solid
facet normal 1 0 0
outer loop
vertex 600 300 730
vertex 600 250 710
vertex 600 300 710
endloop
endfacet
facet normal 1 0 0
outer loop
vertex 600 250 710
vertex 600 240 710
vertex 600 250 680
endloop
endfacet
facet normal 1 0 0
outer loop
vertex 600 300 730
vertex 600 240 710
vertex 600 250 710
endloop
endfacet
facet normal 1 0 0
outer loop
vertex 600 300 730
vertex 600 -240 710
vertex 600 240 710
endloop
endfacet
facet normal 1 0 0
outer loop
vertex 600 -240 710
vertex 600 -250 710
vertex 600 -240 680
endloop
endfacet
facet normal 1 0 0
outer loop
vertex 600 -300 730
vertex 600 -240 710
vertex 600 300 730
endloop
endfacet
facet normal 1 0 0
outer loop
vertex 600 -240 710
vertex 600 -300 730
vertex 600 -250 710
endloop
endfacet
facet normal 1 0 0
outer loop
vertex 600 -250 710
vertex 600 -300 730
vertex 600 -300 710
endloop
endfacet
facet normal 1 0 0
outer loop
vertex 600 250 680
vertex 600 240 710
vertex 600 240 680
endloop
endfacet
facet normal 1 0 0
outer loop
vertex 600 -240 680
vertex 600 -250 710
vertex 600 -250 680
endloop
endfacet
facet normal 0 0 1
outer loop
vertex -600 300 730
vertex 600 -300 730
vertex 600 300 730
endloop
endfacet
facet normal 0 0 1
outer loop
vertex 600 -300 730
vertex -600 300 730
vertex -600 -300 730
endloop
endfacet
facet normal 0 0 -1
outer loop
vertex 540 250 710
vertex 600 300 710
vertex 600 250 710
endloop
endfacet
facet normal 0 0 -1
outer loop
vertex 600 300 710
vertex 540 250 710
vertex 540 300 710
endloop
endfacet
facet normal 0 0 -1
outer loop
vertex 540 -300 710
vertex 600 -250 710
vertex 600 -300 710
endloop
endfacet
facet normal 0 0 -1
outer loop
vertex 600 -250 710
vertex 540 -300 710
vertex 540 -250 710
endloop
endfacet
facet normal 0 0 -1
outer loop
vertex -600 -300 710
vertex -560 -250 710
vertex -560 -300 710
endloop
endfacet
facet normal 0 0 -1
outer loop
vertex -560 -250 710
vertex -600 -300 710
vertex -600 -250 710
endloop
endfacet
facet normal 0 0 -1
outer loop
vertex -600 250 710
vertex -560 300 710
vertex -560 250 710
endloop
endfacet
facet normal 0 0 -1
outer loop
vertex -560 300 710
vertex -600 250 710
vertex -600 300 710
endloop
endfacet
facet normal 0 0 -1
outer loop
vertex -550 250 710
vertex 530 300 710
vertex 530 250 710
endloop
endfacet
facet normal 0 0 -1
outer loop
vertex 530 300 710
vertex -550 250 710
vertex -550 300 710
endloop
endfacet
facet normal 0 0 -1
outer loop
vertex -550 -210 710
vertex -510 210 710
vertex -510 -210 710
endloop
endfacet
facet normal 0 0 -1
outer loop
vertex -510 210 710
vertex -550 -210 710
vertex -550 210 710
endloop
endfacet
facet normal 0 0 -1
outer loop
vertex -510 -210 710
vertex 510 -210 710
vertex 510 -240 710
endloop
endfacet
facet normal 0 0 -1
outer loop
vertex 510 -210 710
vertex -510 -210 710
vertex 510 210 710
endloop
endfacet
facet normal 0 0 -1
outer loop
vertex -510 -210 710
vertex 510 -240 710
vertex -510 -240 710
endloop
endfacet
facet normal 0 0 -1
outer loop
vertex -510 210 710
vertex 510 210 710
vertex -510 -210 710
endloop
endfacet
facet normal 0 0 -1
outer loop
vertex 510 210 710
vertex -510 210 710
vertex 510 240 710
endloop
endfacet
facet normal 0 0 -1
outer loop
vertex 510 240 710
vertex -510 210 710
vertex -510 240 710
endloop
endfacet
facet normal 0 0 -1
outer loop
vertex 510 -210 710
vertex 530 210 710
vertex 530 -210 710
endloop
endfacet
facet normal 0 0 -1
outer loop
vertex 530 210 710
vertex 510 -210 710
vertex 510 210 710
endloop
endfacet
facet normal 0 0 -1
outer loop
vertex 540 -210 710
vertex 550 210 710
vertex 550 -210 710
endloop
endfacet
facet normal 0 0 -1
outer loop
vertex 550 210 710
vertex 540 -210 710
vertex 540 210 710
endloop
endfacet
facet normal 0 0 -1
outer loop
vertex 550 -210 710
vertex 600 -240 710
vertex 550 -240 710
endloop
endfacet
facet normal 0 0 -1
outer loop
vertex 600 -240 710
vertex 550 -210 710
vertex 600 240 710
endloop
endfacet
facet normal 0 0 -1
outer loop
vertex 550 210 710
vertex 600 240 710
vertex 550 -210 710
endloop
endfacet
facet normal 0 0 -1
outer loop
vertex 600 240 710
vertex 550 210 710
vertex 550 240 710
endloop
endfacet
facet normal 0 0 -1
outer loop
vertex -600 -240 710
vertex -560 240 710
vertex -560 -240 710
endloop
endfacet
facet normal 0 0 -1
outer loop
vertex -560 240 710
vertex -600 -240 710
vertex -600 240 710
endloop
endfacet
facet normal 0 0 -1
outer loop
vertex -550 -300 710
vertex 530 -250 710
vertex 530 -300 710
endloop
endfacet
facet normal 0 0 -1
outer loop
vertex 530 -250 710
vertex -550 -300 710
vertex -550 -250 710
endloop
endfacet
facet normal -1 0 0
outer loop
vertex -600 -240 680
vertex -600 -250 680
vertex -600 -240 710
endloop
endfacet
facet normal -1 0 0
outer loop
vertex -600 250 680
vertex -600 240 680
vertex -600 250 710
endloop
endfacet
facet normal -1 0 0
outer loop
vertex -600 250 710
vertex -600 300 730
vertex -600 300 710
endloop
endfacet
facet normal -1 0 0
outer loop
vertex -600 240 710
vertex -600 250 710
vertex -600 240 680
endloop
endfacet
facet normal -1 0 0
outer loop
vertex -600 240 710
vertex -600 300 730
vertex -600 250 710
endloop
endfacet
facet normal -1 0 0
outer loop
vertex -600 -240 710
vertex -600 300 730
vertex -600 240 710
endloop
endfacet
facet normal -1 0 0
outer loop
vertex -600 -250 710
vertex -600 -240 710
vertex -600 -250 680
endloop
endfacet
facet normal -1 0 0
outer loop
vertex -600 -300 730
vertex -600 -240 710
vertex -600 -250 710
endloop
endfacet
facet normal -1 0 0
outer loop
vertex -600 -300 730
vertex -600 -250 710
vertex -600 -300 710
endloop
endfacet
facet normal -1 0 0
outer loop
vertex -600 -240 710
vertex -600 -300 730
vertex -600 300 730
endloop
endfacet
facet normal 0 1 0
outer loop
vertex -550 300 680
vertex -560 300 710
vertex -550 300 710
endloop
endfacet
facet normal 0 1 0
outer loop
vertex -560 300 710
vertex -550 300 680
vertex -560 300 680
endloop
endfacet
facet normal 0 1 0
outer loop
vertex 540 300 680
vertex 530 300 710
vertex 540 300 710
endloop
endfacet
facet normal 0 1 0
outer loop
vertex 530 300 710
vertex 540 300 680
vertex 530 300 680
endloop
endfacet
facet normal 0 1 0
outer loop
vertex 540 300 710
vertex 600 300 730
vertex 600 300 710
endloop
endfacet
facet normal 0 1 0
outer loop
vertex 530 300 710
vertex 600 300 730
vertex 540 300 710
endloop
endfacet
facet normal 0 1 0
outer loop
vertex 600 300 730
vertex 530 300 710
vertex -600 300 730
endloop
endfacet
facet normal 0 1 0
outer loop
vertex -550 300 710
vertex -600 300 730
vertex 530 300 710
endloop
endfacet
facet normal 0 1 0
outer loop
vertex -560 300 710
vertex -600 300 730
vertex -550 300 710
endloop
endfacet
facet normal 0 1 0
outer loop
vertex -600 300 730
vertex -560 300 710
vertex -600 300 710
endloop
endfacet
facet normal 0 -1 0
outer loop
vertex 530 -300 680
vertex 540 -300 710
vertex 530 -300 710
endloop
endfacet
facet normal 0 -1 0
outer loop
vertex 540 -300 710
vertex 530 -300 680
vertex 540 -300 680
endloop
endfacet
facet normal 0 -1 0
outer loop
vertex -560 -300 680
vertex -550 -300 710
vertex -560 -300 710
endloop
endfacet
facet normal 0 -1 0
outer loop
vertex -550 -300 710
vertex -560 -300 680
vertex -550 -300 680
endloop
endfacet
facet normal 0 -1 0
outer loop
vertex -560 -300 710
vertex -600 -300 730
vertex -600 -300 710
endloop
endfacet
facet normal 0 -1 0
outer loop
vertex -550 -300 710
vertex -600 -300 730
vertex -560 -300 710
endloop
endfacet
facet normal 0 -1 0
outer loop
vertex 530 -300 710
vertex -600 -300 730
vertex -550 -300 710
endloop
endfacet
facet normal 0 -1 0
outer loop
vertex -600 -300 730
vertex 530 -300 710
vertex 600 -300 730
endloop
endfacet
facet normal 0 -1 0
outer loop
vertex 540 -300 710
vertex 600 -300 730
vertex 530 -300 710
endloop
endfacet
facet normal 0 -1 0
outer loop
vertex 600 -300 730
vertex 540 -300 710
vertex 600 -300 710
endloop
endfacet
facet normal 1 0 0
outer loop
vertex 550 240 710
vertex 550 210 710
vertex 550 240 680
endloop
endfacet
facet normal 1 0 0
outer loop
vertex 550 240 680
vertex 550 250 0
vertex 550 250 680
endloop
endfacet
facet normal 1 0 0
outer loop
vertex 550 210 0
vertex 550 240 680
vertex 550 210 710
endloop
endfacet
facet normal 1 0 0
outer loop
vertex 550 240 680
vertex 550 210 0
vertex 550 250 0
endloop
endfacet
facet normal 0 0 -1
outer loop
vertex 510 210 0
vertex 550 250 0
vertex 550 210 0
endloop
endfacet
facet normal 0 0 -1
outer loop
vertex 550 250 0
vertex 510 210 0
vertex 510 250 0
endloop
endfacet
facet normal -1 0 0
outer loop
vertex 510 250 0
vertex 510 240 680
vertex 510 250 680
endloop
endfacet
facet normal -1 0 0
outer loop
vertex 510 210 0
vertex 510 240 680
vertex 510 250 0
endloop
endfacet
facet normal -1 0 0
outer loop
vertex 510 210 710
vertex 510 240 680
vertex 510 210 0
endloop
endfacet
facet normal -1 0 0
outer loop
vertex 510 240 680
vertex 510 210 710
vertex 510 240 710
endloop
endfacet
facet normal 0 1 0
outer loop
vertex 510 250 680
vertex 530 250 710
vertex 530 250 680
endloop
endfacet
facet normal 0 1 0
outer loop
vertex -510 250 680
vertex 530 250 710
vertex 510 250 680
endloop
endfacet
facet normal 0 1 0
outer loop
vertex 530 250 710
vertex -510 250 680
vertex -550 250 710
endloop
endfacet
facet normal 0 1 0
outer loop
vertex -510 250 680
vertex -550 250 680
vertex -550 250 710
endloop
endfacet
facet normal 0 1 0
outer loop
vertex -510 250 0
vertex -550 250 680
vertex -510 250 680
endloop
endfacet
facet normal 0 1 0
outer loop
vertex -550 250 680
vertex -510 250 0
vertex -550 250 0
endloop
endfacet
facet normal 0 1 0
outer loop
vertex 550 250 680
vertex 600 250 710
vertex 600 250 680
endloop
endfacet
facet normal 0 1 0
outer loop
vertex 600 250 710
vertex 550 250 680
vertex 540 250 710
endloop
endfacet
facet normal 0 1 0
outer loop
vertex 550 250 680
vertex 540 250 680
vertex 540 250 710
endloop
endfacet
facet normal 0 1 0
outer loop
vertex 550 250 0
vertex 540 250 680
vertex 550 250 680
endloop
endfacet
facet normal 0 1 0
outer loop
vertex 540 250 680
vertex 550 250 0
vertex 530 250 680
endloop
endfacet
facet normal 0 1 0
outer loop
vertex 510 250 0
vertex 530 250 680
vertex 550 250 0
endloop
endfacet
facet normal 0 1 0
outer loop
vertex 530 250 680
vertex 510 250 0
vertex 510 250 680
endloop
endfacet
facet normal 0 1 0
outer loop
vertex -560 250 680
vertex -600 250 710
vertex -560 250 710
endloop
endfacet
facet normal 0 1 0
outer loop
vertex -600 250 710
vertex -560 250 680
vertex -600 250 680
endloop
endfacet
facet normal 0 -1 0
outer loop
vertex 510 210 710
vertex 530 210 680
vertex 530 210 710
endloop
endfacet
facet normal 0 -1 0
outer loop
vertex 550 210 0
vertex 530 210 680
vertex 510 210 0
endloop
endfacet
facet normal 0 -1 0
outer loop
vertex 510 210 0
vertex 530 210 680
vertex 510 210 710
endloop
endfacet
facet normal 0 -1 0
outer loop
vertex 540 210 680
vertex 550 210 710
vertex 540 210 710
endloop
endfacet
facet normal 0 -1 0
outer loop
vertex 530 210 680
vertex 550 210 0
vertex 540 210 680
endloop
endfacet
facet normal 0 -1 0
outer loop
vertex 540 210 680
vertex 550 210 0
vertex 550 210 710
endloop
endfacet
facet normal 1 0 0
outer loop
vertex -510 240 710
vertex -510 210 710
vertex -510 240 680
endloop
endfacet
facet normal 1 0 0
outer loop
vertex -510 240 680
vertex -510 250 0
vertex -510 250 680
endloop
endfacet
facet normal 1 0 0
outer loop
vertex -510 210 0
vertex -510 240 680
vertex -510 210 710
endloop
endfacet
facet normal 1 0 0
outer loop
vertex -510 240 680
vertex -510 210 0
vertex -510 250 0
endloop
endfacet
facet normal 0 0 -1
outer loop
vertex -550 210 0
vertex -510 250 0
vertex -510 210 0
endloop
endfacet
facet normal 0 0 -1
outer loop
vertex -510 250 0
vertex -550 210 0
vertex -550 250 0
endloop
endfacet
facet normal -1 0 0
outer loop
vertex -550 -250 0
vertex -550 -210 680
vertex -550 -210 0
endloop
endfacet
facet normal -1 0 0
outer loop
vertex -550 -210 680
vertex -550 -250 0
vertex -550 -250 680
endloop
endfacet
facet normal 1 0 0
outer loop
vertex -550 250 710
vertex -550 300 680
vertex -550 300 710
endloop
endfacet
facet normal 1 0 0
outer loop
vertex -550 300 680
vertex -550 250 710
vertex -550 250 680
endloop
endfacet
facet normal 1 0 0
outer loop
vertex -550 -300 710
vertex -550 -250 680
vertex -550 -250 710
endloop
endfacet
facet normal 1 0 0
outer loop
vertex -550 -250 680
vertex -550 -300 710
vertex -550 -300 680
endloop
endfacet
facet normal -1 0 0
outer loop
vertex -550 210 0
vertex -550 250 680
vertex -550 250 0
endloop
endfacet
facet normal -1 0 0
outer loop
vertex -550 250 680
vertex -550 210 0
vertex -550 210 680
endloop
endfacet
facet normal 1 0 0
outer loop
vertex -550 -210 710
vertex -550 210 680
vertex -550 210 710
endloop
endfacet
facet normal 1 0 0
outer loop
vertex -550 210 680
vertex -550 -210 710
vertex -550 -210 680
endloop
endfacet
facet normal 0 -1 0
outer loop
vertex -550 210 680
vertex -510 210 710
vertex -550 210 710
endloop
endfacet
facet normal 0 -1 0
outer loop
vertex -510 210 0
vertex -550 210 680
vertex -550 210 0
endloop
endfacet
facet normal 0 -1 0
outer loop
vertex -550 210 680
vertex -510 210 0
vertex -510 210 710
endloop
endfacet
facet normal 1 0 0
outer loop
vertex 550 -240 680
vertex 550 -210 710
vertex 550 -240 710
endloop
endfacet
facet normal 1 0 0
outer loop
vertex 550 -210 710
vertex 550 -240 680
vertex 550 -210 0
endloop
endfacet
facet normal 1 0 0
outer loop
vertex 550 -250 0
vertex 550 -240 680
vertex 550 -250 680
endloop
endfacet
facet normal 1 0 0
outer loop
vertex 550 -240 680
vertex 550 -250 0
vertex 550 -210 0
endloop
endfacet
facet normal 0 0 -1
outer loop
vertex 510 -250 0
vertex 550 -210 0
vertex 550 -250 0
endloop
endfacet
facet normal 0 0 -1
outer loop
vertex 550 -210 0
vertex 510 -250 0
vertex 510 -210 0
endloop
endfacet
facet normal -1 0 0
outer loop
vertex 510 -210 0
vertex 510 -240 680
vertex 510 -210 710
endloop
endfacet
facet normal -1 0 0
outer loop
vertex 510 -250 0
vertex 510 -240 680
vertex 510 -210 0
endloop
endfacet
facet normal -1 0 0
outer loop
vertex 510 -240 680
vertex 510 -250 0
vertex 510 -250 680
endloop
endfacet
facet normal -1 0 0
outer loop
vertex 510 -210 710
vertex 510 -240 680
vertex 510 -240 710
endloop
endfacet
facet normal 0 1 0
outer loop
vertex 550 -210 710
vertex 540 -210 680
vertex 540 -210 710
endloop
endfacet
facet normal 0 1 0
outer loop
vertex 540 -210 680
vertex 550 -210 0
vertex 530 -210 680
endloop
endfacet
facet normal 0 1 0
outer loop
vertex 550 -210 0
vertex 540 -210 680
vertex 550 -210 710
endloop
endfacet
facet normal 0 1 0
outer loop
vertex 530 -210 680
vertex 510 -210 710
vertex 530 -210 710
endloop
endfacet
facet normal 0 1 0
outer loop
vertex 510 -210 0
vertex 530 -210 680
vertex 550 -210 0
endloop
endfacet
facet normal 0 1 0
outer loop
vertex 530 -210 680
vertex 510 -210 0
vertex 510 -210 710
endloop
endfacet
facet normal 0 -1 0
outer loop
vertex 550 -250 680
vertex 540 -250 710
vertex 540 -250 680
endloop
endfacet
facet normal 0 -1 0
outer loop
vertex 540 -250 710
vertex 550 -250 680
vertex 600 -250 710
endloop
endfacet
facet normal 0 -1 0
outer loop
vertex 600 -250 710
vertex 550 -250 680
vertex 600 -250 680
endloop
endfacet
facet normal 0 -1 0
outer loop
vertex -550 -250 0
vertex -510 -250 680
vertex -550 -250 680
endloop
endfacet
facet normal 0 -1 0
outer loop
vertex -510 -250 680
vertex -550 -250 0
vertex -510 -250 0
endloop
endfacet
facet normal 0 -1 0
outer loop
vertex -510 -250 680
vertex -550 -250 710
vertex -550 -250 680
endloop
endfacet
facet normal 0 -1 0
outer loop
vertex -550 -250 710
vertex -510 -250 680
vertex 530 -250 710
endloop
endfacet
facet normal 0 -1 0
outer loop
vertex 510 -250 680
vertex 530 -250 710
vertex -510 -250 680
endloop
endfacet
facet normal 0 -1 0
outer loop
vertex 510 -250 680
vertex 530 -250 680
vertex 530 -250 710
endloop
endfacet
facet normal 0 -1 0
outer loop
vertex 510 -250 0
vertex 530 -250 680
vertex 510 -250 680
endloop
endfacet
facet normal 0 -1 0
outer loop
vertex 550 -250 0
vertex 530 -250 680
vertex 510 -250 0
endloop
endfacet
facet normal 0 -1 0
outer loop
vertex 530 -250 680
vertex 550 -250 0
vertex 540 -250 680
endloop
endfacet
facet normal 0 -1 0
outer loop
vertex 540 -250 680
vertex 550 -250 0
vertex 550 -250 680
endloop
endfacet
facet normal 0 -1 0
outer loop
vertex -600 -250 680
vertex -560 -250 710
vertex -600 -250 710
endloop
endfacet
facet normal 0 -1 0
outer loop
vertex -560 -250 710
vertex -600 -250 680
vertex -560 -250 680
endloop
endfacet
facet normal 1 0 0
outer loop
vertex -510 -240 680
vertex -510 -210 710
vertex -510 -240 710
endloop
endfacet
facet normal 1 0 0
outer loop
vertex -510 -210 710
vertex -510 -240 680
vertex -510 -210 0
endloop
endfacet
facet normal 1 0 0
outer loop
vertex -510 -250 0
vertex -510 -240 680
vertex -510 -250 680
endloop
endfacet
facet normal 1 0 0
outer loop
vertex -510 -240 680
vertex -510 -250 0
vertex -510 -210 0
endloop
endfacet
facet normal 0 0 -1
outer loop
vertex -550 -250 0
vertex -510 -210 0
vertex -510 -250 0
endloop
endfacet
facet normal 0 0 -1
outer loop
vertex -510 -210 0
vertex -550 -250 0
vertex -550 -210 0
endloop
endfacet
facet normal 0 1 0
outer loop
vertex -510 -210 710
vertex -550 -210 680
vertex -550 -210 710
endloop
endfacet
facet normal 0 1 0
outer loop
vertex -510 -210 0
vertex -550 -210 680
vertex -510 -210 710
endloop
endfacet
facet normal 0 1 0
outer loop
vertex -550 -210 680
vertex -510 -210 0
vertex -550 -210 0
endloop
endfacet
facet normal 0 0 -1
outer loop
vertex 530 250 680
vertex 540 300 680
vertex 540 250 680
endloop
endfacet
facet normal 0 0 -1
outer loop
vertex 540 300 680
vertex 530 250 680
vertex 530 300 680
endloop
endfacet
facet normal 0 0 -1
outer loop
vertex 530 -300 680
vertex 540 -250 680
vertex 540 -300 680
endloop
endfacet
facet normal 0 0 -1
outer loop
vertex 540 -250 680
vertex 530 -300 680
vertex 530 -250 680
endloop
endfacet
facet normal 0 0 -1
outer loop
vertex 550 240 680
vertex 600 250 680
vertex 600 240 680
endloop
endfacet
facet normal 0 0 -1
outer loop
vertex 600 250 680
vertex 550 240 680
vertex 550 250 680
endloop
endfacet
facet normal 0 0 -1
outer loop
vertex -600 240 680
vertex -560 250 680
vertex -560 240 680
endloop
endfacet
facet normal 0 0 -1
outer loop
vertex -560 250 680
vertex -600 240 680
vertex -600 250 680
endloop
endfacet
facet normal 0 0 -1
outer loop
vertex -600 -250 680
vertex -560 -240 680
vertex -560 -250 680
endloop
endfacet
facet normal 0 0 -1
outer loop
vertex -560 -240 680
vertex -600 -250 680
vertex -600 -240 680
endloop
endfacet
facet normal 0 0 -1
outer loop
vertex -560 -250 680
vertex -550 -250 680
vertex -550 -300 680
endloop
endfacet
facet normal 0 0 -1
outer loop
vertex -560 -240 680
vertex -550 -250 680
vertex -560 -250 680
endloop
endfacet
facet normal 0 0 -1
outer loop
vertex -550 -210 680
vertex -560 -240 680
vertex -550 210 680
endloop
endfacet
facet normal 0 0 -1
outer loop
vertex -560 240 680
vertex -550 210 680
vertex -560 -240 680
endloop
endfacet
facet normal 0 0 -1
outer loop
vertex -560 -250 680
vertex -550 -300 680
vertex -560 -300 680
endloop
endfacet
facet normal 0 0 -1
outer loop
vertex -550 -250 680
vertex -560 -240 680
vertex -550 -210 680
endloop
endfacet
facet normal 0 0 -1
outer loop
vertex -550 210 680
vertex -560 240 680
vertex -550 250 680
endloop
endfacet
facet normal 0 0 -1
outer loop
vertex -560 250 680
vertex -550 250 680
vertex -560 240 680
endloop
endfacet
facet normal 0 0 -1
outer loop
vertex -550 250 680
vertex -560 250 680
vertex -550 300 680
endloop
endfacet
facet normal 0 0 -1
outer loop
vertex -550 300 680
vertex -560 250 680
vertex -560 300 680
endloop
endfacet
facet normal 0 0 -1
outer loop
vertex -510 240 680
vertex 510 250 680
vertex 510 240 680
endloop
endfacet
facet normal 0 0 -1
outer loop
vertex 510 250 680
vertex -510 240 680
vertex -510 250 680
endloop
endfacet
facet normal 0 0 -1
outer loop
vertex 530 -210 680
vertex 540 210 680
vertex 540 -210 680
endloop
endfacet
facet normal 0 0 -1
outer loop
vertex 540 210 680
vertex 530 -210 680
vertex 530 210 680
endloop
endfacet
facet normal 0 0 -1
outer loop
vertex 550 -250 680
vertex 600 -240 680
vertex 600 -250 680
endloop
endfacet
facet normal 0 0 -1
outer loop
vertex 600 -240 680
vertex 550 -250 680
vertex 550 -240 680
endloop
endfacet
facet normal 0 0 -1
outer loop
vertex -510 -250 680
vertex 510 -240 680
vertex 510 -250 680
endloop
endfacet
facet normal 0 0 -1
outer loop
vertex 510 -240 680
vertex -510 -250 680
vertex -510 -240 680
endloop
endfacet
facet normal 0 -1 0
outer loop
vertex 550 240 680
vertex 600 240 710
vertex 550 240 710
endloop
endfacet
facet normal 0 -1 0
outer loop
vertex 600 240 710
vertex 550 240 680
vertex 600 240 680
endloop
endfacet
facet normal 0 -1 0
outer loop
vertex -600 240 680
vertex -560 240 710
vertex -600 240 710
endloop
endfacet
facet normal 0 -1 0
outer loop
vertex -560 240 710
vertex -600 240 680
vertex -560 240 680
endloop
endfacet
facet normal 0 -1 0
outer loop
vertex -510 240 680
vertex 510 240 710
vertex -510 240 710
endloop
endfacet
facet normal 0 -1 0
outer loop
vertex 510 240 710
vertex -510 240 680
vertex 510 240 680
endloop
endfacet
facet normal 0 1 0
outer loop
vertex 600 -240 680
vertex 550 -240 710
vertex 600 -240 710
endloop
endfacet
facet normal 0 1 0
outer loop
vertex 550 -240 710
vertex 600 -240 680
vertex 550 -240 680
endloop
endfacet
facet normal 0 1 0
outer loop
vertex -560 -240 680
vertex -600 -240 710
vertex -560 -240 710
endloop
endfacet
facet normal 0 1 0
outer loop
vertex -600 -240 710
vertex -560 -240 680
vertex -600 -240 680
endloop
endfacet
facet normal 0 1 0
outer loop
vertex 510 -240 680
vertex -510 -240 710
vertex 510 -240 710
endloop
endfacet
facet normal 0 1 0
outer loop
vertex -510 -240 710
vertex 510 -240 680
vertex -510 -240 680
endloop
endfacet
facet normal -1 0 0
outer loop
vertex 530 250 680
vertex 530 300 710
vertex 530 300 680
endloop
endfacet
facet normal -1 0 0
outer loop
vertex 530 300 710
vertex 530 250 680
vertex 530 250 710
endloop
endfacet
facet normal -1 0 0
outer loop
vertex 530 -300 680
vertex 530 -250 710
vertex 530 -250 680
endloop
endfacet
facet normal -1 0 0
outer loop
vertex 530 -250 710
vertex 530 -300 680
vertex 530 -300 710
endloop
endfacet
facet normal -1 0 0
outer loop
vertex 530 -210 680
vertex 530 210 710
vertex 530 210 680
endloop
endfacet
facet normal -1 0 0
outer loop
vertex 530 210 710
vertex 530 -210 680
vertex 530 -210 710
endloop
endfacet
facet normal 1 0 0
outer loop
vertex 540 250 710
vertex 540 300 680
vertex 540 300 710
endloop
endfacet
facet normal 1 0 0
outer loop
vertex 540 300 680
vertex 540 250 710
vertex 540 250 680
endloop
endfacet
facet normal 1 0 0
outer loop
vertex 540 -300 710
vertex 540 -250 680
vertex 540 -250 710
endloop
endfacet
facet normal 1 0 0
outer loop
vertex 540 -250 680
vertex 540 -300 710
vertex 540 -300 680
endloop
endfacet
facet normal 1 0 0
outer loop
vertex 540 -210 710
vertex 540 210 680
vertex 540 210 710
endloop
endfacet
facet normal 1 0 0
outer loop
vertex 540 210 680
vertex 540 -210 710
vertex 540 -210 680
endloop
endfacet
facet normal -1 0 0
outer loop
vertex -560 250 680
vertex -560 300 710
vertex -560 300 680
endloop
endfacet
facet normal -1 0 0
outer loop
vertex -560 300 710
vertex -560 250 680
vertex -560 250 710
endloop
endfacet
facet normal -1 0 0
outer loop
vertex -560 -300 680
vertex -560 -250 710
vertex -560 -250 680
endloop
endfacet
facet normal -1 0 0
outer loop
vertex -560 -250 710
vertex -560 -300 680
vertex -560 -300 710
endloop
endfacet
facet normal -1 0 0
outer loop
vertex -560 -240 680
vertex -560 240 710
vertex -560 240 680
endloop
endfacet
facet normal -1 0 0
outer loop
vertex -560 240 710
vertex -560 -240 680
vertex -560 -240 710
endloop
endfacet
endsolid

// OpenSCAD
// Table parameters in millimeters
table_length = 1200;
table_width = 600;
table_height = 740;
top_thickness = 20;
leg_thickness = 40;
leg_inset = 50;
apron_height = 40;
apron_thickness = 10;
leg_engagement = 5;

// Tabletop module
module tabletop() {
    translate([0, 0, table_height - top_thickness])
        cube([table_length, table_width, top_thickness], center=true);
}

// Leg module
module leg() {
    cube([leg_thickness, leg_thickness, table_height - top_thickness + leg_engagement]);
}

// Apron module (single board)
module apron_board(length) {
    cube([length, apron_thickness, apron_height]);
}

// Complete table assembly
module table_assembly() {
    union() {
        // Tabletop
        tabletop();
        
        // Calculate leg positions
        // Legs positioned so their outer faces are inset by leg_inset from tabletop edges
        leg_x_offset = table_length/2 - leg_inset - leg_thickness;
        leg_y_offset = table_width/2 - leg_inset - leg_thickness;
        
        // Four legs
        translate([leg_x_offset, leg_y_offset, 0])
            leg();
        
        translate([-leg_x_offset - leg_thickness, leg_y_offset, 0])
            leg();
        
        translate([leg_x_offset, -leg_y_offset - leg_thickness, 0])
            leg();
        
        translate([-leg_x_offset - leg_thickness, -leg_y_offset - leg_thickness, 0])
            leg();
        
        // Apron boards
        apron_z = table_height - top_thickness - apron_height;
        
        // Front apron (along length, positive Y side)
        translate([-table_length/2, table_width/2 - leg_inset - apron_thickness, apron_z])
            apron_board(table_length);
        
        // Back apron (along length, negative Y side)
        translate([-table_length/2, -table_width/2 + leg_inset, apron_z])
            apron_board(table_length);
        
        // Right apron (along width, positive X side)
        translate([table_length/2 - leg_inset - apron_thickness, -table_width/2, apron_z])
            rotate([0, 0, 90])
                apron_board(table_width);
        
        // Left apron (along width, negative X side)
        translate([-table_length/2 + leg_inset, -table_width/2, apron_z])
            rotate([0, 0, 90])
                apron_board(table_width);
    }
}

// Generate the complete table
table_assembly();
